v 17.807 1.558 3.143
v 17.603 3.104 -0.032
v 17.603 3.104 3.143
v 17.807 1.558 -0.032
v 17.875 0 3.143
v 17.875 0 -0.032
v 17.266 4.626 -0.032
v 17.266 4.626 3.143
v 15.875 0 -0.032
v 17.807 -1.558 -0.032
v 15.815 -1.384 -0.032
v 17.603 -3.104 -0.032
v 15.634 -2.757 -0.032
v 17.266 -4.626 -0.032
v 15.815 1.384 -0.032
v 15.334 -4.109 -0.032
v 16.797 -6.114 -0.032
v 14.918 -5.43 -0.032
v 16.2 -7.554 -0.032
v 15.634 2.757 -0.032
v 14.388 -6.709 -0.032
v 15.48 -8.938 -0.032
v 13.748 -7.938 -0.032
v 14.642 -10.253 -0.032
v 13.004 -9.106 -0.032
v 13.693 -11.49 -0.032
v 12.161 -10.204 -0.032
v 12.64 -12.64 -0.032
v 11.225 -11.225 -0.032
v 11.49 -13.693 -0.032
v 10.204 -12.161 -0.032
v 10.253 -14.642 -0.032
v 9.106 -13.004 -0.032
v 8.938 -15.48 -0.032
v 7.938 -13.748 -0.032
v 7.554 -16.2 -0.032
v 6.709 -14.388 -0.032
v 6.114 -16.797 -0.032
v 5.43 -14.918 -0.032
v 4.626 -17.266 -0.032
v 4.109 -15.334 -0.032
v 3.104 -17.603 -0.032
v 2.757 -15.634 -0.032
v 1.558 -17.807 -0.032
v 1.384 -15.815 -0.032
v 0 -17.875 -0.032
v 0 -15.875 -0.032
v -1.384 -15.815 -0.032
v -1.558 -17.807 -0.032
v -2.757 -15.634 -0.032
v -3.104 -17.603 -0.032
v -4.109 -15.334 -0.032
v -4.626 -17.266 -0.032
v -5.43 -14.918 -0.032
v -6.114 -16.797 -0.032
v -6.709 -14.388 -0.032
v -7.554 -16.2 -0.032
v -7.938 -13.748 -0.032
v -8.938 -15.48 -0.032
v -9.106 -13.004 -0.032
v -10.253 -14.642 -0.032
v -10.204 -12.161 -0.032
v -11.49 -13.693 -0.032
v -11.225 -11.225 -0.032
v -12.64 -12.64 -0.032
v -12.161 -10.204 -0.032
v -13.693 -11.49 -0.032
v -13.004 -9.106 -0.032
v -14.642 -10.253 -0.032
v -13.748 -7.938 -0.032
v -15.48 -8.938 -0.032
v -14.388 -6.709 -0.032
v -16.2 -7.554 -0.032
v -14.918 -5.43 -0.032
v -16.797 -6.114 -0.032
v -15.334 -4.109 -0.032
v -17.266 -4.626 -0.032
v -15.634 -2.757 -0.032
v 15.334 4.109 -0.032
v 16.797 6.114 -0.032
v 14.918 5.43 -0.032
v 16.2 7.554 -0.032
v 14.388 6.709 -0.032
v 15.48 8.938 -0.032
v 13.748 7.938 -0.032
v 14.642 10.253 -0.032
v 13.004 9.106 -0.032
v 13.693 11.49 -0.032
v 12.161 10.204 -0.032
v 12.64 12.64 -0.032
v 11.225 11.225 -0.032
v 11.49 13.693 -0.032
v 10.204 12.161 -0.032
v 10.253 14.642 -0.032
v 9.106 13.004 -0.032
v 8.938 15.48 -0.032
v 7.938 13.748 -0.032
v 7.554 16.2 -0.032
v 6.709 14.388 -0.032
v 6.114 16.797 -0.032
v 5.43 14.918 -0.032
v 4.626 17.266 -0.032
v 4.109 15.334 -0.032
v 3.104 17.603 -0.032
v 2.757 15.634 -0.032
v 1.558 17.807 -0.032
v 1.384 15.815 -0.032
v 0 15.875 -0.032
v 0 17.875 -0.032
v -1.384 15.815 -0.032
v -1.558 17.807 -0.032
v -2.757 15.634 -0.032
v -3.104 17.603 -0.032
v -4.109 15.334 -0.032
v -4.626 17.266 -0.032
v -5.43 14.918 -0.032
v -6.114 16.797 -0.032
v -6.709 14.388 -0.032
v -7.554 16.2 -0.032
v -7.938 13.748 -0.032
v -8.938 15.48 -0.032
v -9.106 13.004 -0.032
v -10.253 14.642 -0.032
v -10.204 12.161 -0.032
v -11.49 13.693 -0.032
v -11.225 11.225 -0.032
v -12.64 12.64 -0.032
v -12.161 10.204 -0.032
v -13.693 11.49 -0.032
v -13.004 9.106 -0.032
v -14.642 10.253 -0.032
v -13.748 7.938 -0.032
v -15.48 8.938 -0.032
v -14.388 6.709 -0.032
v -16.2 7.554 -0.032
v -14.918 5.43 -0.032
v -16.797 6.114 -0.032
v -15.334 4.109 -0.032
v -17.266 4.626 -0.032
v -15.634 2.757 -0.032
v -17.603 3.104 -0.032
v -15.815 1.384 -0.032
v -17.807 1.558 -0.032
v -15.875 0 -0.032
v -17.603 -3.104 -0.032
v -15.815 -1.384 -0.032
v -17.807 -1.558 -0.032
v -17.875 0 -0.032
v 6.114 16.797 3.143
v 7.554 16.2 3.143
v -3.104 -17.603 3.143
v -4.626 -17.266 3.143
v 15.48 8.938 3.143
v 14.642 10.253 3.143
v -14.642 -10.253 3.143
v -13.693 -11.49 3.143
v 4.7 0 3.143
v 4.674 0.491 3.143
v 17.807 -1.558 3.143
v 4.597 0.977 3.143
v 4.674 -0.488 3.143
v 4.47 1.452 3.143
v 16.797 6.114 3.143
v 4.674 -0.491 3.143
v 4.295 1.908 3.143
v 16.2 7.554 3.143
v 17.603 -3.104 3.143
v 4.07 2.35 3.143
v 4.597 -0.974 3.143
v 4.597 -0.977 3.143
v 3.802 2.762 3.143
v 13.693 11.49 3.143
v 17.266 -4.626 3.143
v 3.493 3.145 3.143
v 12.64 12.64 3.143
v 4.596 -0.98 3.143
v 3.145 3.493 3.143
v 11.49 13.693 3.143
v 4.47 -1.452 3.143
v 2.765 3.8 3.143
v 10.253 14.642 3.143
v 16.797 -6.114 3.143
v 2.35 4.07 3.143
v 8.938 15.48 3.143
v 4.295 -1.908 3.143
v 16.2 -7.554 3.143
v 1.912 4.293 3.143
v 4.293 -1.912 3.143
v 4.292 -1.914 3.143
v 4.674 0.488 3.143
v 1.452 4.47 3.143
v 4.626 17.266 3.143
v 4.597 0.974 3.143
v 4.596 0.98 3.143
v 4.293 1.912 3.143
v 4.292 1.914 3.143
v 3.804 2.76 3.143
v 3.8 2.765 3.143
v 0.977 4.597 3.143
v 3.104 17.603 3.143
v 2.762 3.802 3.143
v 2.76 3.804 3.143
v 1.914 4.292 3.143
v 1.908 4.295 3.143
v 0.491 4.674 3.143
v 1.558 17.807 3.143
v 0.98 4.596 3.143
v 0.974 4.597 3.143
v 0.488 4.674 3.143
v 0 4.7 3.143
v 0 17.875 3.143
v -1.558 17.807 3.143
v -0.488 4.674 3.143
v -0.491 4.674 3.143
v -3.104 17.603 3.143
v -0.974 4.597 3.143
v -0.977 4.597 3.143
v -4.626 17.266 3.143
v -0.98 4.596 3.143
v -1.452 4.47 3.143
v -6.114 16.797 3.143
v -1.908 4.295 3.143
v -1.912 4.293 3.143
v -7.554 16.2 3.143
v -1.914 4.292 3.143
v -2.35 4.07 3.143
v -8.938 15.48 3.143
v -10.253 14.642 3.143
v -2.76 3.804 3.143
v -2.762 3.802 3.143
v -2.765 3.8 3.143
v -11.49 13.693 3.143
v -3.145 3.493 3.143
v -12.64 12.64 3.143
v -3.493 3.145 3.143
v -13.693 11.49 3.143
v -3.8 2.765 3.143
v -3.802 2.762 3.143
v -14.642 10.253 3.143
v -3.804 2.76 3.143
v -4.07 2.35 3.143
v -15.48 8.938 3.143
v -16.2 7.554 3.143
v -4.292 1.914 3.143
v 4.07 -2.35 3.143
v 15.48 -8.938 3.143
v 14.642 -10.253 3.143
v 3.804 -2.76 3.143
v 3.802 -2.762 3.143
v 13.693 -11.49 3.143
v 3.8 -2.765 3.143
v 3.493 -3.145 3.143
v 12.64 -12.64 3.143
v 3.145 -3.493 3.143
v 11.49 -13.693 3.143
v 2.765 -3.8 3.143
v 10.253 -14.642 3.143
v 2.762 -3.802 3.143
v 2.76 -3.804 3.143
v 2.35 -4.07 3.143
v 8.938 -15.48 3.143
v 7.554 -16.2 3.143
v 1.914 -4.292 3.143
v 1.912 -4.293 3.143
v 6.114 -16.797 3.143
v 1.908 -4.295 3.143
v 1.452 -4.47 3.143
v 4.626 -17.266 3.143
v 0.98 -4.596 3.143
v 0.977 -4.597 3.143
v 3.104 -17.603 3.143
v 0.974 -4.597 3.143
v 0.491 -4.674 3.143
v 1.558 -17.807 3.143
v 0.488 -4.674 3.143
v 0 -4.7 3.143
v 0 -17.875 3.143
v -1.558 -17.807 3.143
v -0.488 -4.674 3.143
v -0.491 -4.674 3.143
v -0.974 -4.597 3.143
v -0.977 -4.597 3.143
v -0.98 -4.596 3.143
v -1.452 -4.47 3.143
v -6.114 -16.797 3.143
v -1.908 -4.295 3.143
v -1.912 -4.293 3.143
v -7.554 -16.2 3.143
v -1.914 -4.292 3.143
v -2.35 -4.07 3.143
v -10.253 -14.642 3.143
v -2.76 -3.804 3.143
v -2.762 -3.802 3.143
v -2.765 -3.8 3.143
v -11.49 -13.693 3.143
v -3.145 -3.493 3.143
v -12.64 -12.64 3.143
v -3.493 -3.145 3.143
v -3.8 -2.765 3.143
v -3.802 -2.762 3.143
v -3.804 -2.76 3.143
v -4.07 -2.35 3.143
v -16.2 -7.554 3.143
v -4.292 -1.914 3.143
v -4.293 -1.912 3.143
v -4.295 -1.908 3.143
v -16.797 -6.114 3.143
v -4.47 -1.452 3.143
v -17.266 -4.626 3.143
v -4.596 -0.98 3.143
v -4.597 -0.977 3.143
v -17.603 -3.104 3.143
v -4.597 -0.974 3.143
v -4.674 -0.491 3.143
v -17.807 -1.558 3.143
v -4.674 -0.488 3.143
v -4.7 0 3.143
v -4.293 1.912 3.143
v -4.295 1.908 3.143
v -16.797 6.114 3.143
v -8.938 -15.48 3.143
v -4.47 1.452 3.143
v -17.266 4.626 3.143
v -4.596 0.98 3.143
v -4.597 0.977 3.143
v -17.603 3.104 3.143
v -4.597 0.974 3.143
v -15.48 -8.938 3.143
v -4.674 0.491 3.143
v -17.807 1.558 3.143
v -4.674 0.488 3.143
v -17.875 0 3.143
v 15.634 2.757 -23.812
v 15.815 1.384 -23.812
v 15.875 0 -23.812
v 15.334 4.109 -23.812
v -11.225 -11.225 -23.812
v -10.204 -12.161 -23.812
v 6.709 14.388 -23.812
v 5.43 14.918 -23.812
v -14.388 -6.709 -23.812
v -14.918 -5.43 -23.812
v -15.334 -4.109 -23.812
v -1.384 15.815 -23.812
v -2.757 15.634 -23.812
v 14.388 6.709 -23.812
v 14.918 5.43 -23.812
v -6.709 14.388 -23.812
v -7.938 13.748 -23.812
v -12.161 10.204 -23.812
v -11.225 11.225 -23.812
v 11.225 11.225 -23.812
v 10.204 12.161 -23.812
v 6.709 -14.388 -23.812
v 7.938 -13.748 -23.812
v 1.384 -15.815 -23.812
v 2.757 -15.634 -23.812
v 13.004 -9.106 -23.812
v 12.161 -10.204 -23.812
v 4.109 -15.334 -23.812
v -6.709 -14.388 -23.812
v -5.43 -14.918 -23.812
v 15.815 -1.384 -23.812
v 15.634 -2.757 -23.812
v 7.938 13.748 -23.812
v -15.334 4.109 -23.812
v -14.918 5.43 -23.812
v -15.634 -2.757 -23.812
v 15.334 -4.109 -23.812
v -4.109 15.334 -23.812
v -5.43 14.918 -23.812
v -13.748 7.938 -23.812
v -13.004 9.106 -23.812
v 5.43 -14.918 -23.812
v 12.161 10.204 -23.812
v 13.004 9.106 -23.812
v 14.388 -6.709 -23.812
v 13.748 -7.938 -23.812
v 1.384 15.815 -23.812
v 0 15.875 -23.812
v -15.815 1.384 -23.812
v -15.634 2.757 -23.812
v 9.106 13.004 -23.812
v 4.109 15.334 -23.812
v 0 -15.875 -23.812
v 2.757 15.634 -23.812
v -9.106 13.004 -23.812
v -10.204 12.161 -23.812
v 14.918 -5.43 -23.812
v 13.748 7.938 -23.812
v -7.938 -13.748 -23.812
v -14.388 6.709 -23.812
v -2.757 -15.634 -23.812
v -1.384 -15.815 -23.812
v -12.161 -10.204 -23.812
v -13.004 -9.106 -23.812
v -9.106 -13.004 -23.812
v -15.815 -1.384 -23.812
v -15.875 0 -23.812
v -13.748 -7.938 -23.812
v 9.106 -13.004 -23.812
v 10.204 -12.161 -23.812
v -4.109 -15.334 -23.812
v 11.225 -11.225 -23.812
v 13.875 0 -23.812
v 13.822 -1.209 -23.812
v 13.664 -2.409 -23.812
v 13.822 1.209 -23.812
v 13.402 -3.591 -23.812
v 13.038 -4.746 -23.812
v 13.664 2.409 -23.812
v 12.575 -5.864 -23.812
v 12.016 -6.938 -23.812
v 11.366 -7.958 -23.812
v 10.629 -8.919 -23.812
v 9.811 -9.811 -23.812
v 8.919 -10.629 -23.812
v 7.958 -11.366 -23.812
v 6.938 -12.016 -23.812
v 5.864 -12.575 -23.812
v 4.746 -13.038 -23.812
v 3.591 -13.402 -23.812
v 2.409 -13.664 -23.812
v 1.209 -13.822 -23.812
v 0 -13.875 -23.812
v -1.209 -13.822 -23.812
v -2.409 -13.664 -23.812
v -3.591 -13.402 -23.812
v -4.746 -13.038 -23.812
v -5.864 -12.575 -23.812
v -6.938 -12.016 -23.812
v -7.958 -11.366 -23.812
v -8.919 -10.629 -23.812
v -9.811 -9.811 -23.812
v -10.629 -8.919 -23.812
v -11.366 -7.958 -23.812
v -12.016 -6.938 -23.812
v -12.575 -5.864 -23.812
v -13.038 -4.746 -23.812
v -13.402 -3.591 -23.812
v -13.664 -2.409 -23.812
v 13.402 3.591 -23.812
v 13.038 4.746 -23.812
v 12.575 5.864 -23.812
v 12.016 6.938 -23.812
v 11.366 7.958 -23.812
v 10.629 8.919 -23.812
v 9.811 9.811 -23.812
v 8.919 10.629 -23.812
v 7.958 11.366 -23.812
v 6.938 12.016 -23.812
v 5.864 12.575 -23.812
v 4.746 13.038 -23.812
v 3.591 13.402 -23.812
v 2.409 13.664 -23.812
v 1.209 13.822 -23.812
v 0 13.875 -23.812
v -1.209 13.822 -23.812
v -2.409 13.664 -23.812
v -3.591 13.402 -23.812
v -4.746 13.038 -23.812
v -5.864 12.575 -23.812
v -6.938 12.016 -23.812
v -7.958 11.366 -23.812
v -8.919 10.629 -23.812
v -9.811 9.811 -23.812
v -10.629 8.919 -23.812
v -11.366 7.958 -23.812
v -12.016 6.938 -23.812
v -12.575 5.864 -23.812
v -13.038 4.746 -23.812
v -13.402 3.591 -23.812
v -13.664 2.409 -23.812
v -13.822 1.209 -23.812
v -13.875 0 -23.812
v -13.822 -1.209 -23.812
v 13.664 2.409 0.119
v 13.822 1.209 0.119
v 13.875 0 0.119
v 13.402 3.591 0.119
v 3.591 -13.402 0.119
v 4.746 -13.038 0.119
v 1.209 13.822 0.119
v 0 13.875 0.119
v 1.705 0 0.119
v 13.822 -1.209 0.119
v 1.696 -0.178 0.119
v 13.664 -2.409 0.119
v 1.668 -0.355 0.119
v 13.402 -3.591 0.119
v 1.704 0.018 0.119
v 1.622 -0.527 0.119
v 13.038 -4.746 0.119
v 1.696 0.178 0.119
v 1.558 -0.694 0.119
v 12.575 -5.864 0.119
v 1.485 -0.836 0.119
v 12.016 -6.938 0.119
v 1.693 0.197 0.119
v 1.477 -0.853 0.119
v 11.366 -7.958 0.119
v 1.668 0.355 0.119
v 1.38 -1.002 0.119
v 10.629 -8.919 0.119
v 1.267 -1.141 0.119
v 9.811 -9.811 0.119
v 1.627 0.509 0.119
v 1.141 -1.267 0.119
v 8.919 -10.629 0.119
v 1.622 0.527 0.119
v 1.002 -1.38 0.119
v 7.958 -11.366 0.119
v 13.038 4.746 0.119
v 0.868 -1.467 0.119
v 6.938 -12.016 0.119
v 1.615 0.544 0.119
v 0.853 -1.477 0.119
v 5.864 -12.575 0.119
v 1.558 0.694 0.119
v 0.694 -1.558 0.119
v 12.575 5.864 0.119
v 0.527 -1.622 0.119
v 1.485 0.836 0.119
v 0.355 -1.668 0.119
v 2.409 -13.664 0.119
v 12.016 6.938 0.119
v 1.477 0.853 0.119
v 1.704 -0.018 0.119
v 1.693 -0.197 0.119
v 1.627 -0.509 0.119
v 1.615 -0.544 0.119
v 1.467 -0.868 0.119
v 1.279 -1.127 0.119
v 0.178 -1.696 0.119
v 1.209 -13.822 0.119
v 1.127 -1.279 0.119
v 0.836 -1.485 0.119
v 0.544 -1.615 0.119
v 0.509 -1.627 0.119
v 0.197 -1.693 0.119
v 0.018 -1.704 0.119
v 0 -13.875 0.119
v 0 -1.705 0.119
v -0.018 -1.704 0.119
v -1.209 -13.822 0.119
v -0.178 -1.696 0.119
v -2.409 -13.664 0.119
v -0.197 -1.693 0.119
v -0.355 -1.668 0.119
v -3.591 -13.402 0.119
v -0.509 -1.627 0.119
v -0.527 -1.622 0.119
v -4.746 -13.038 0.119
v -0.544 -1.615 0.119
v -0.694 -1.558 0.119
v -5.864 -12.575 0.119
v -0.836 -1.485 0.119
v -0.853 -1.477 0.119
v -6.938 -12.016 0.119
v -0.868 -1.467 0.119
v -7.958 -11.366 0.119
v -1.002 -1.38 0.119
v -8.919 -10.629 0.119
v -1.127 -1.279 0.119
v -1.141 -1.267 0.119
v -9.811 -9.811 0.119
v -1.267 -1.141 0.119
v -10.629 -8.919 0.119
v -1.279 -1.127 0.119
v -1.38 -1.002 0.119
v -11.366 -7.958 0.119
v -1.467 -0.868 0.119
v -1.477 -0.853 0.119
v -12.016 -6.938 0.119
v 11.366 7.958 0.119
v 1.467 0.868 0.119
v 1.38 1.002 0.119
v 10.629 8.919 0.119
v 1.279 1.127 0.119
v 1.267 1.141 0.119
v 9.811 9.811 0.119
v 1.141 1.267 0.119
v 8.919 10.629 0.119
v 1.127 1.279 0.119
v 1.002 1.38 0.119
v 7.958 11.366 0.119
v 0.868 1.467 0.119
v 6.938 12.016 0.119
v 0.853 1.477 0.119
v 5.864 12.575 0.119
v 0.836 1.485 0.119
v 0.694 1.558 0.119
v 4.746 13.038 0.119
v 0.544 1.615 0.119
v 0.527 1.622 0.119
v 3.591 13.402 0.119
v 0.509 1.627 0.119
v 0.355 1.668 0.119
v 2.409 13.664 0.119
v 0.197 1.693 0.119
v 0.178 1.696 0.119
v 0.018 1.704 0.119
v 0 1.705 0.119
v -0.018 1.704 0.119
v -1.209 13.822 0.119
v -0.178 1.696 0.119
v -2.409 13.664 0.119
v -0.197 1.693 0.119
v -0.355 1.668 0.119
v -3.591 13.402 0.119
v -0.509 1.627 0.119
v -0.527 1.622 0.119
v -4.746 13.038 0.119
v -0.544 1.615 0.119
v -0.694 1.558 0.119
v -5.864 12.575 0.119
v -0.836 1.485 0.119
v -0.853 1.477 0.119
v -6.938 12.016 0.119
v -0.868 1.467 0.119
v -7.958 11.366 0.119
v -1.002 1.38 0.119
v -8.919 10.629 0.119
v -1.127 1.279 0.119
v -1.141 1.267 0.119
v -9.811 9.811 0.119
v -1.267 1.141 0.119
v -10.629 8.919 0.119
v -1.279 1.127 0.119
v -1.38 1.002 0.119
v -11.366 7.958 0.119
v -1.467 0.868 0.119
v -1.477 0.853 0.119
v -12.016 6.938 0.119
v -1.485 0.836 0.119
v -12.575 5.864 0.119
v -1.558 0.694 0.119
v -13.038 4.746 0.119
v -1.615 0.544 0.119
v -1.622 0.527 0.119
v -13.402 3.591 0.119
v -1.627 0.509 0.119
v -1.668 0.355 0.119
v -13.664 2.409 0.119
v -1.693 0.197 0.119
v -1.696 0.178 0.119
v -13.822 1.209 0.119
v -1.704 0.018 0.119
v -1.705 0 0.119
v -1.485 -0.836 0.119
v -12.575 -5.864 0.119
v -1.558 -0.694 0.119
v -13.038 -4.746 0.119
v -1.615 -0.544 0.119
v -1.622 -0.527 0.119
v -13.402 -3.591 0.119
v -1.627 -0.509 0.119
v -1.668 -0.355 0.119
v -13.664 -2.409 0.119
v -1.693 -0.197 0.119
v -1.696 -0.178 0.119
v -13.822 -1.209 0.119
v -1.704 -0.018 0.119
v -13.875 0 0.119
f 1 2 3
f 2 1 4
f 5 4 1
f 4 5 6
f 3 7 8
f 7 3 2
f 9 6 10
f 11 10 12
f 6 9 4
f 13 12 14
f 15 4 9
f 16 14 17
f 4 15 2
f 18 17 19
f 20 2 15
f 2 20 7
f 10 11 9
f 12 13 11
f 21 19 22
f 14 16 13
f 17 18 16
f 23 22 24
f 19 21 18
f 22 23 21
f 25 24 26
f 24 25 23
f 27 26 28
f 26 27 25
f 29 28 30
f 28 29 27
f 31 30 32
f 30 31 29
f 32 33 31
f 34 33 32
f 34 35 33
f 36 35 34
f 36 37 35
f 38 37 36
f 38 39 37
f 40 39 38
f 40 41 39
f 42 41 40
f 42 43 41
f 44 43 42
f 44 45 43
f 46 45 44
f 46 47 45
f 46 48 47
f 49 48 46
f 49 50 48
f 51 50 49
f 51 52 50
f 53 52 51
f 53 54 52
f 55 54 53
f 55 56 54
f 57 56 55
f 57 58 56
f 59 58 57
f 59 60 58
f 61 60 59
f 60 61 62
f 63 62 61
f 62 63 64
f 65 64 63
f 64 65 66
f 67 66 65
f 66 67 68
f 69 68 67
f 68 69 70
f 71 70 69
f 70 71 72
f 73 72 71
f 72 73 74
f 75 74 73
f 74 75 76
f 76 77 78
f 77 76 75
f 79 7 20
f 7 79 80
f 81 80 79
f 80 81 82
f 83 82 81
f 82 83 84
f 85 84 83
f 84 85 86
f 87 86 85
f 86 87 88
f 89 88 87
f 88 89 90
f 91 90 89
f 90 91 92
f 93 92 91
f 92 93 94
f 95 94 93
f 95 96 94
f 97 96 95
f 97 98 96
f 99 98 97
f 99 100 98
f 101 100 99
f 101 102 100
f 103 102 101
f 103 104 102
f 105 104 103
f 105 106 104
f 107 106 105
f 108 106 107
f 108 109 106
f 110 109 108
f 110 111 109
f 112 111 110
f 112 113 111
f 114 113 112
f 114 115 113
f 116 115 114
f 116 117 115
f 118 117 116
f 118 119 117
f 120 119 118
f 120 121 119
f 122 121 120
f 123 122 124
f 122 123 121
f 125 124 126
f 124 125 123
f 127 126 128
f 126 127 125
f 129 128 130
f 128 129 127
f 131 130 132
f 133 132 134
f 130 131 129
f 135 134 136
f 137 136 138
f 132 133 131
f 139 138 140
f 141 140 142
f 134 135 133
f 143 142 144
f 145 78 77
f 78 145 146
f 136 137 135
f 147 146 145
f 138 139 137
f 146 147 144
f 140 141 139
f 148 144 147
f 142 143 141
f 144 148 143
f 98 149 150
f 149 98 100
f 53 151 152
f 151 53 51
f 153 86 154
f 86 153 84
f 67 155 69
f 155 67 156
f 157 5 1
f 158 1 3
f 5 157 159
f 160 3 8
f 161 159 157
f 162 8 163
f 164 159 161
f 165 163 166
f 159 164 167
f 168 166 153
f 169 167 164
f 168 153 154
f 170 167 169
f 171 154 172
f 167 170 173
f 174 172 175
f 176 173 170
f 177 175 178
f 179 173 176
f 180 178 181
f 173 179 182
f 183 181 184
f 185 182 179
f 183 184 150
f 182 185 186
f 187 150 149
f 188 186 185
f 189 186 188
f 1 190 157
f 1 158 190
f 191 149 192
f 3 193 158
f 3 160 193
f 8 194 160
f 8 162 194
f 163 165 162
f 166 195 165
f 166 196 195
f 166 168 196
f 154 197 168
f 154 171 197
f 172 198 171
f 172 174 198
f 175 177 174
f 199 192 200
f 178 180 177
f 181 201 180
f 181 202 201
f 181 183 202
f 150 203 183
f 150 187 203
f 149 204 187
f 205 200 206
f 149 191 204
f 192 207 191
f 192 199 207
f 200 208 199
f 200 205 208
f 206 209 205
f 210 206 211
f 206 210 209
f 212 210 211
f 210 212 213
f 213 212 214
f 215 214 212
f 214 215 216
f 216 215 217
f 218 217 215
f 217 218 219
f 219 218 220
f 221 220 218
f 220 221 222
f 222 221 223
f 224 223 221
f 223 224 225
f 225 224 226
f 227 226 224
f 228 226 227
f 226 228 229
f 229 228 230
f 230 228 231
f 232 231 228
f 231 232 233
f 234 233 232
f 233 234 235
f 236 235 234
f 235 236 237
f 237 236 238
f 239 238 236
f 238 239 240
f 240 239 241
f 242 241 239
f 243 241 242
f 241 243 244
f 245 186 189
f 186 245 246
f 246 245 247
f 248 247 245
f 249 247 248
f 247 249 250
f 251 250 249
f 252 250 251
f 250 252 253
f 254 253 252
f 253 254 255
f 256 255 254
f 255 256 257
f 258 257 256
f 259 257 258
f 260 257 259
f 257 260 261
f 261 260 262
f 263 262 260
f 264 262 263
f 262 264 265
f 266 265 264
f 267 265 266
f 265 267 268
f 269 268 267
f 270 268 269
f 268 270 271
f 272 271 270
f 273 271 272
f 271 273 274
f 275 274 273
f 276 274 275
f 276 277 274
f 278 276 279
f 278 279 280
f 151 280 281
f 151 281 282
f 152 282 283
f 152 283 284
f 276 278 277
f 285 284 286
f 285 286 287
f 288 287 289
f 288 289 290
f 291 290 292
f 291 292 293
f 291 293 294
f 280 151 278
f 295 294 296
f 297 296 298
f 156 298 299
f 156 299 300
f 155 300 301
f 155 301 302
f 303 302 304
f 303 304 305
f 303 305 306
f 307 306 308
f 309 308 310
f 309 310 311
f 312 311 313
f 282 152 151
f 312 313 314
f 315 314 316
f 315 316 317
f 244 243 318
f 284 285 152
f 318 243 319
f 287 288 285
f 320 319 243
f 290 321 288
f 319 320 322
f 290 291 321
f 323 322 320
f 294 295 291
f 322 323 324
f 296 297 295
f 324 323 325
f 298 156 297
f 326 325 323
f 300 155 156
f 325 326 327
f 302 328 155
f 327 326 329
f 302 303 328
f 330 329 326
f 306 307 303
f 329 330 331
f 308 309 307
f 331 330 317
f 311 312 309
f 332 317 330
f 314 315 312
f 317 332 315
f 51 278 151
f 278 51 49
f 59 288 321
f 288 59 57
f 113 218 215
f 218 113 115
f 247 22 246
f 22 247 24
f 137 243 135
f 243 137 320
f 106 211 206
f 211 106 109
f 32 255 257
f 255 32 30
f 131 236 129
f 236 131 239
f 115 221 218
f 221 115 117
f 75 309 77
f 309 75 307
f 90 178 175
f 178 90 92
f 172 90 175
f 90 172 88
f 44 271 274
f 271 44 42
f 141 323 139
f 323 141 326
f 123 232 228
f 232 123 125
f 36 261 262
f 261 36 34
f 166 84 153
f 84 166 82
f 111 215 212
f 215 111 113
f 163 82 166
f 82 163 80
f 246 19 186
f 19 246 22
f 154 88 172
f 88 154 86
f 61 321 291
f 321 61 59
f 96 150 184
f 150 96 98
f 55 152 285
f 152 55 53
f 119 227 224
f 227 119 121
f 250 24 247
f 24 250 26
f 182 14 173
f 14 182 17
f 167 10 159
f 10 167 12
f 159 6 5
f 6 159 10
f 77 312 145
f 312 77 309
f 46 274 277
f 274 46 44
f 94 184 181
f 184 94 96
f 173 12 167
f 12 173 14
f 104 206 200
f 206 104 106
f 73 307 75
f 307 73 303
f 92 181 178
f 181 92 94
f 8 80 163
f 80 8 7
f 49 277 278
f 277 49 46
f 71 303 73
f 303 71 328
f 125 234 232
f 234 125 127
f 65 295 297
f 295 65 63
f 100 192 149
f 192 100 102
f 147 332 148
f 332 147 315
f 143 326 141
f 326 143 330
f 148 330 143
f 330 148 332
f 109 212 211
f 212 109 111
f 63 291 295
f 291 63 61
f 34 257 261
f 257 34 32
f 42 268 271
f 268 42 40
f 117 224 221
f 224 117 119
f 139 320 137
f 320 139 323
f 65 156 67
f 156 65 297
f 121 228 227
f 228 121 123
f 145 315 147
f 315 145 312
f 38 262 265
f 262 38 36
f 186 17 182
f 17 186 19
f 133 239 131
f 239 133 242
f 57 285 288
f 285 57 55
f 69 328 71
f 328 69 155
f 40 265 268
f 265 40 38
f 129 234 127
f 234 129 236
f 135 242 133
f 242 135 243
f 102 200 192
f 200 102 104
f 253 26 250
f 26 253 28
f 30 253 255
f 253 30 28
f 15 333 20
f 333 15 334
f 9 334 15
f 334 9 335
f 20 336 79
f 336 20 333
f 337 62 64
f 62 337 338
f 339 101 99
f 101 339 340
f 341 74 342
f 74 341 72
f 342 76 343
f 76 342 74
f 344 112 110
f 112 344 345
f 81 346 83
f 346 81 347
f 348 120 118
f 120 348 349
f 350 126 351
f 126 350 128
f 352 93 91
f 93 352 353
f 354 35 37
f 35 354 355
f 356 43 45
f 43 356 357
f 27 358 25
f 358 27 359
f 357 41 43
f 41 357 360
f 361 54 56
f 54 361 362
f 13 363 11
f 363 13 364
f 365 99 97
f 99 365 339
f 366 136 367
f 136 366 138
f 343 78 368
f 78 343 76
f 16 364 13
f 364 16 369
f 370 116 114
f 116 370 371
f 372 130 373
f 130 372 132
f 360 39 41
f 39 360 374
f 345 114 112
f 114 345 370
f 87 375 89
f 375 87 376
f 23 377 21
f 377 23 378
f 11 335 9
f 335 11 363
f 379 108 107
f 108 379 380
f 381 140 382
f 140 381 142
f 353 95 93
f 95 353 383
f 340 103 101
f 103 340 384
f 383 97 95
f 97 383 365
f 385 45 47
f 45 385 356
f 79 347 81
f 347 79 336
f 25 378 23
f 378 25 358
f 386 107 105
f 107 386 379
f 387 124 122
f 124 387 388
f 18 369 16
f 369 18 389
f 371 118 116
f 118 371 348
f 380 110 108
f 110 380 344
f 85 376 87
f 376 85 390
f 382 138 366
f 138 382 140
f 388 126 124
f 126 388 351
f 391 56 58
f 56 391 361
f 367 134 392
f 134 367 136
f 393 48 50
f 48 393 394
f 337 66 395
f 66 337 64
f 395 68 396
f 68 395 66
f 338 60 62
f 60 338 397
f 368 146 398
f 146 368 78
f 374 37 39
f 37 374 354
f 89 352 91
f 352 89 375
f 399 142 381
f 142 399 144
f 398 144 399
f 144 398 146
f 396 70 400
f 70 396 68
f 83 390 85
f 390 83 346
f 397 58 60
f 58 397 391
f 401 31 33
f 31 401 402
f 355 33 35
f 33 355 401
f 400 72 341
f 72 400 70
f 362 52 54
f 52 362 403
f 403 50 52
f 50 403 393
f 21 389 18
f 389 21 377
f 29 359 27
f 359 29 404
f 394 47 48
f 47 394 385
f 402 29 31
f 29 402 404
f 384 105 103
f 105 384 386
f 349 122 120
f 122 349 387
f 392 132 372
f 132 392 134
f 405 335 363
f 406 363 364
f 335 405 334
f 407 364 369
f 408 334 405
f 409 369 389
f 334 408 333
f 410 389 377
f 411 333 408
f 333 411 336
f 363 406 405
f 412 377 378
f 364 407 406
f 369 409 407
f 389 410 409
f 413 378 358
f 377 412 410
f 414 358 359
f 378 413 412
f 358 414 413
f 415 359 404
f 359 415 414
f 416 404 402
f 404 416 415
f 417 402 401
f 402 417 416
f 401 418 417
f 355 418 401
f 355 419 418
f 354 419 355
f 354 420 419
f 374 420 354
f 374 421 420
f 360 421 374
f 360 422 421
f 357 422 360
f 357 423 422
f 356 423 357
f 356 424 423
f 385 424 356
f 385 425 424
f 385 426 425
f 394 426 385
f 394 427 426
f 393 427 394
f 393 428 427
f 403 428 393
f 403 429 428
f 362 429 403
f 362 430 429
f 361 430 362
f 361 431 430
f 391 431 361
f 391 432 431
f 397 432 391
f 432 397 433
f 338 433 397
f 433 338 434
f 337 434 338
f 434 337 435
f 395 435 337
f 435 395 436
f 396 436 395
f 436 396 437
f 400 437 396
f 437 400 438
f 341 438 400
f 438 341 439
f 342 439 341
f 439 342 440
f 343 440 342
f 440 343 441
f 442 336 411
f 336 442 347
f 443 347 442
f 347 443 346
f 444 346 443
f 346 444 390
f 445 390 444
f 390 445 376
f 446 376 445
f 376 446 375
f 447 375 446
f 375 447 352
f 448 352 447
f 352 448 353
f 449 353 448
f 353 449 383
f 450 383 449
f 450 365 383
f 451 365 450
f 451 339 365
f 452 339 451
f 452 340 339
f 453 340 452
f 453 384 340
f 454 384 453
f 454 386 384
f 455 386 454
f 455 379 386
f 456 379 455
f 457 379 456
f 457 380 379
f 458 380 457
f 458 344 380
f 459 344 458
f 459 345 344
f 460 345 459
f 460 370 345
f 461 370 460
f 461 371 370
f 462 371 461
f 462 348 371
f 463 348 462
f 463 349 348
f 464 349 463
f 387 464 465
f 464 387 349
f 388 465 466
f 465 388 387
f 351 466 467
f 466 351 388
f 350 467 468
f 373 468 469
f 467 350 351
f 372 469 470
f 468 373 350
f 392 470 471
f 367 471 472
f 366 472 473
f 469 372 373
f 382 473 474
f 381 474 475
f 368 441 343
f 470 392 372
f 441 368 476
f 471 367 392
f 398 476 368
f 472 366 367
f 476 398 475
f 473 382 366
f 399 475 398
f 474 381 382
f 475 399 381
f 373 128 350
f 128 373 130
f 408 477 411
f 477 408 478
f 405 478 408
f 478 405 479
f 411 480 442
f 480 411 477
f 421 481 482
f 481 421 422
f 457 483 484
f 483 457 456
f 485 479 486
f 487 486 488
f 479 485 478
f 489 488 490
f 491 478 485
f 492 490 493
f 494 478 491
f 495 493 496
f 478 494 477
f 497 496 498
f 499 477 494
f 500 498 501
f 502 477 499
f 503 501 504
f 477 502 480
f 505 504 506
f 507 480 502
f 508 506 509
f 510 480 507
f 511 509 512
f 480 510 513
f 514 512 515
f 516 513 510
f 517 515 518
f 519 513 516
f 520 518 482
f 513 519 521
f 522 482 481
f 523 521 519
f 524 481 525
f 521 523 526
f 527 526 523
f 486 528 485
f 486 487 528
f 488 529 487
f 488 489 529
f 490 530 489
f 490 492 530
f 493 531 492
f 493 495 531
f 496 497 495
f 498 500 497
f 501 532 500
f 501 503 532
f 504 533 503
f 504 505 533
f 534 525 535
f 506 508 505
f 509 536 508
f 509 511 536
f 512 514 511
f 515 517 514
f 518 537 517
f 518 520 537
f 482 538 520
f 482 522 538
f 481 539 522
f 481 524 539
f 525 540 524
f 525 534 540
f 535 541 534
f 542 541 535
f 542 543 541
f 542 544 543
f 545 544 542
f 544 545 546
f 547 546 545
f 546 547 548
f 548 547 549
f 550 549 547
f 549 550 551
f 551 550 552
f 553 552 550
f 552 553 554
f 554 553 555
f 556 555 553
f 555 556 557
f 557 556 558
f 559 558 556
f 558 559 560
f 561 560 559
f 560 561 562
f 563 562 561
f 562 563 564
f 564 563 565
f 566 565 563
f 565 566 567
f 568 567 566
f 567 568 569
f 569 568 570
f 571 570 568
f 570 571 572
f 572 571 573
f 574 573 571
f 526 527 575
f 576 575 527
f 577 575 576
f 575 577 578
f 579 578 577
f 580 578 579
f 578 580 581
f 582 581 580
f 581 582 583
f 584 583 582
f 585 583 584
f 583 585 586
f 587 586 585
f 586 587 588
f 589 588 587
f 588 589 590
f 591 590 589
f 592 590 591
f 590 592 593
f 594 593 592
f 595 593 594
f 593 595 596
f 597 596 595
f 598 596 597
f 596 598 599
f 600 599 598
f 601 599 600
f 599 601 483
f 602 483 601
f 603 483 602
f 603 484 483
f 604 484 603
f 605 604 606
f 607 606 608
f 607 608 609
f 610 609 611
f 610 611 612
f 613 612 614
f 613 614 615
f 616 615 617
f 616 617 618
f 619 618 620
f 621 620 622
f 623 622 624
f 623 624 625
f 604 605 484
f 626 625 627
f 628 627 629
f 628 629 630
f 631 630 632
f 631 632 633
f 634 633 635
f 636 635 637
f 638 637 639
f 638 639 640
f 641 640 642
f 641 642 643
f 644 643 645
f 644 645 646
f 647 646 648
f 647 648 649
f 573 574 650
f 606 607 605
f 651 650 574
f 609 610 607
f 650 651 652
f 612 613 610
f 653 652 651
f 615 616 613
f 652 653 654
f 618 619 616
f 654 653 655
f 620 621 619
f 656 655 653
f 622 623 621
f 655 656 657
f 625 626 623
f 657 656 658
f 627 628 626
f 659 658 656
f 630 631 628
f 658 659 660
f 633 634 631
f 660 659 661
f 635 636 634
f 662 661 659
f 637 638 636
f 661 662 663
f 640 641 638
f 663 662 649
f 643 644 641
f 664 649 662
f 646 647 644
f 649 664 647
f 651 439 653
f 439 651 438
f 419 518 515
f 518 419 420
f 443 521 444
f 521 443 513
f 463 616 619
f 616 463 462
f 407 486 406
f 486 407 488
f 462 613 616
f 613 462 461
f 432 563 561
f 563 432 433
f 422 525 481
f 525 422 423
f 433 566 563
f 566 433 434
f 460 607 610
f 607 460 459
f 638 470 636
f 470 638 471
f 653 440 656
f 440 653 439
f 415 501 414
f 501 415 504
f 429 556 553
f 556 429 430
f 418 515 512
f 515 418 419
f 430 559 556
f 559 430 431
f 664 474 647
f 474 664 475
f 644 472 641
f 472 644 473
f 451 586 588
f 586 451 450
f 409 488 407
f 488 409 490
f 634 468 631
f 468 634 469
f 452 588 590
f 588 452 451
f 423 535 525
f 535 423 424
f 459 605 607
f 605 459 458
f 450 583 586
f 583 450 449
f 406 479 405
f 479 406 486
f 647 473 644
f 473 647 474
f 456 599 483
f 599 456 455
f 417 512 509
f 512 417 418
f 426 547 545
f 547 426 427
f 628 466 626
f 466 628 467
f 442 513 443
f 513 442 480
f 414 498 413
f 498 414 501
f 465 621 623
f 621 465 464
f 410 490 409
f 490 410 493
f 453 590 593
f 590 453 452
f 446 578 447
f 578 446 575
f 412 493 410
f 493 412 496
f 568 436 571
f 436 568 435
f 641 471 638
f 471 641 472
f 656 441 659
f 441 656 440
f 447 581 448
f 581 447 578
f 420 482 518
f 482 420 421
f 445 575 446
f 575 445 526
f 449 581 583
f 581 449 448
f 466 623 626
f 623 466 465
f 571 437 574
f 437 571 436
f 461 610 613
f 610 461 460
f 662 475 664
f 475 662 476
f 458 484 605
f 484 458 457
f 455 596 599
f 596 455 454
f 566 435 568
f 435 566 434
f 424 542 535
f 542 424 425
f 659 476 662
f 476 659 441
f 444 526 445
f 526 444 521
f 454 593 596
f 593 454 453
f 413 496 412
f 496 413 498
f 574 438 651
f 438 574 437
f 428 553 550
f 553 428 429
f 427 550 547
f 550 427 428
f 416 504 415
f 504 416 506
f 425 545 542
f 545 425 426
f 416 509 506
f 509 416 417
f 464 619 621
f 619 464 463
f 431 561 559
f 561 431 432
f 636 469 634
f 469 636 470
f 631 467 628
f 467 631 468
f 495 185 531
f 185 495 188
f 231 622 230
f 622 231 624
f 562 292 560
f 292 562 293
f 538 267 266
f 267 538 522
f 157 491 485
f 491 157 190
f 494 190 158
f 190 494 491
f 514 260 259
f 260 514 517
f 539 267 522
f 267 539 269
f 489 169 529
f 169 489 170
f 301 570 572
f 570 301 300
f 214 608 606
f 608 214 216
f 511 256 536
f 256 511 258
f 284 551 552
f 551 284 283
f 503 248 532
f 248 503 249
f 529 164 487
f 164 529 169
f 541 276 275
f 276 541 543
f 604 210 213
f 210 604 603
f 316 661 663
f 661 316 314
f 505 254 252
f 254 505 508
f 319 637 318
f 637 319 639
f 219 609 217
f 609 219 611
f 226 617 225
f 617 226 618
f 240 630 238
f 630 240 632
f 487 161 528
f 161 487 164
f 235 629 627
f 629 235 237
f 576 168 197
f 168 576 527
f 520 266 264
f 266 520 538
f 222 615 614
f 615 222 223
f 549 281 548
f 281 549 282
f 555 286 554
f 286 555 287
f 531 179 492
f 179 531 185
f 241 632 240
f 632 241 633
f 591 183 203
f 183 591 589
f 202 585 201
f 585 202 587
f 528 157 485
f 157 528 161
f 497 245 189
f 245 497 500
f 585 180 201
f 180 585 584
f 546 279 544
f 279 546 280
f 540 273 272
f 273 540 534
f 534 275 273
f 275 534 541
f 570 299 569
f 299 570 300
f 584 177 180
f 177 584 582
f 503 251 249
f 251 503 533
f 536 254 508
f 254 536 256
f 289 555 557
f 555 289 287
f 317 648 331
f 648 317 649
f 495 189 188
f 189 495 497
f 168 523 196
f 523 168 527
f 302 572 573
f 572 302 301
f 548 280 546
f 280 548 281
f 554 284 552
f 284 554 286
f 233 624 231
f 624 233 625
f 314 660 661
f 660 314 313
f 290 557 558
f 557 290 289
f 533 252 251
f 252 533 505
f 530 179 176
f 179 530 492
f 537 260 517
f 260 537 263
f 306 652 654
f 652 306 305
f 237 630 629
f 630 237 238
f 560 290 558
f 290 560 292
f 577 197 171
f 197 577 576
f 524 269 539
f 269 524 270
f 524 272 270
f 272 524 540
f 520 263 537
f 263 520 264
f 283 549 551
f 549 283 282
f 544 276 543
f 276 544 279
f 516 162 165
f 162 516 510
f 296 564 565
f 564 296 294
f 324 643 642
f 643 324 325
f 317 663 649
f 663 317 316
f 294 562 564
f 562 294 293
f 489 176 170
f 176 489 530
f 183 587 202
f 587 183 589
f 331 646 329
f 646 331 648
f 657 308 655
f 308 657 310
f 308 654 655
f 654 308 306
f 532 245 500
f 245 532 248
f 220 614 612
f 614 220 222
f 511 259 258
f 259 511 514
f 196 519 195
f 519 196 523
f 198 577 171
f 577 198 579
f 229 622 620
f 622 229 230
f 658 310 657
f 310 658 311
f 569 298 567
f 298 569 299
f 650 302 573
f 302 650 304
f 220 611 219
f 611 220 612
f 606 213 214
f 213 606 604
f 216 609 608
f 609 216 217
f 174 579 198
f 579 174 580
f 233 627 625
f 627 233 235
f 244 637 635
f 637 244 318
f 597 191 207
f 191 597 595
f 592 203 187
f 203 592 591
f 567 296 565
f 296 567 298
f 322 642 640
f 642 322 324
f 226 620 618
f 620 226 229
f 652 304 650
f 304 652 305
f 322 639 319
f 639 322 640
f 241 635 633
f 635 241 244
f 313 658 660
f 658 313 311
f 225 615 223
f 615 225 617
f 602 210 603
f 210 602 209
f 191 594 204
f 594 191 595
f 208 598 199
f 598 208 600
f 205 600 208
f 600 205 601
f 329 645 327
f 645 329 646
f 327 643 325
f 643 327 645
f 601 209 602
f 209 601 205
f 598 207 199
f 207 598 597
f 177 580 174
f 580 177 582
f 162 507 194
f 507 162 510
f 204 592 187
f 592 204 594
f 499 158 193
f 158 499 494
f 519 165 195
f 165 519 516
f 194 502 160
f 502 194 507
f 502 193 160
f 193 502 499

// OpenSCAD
// Telescope Focus Tube Plug

// Diameter of eyepiece tube
od = 31.75; 

// Shoulder Height
shoulder = 2;

// Wall thickness
wt = 2;

// Hole for Alignment
hole = 1; // [1:Yes, 0:No]

$fa=5 * 1;
$fs=0.5 * 1;
top = od * 0.1;
bottom = od * 0.75;

difference()  {

union() {
    translate([0, 0, top * 0.49])
        cylinder(r=od/2 + shoulder, h = top, center=true);
    translate([0, 0, -bottom/2])
        cylinder(r = od/2, h = bottom, center=true);
}

union() {
    translate([0, 0, -bottom/2])
        cylinder(r=od/2-wt, h=bottom*1.01, center=true);
        if (hole == 1) {
            translate([0, 0, 0])  
                cylinder(r1 = 0.5*top, r2 = top*1.5, h = top*1.01);
        }
    }
}



    
